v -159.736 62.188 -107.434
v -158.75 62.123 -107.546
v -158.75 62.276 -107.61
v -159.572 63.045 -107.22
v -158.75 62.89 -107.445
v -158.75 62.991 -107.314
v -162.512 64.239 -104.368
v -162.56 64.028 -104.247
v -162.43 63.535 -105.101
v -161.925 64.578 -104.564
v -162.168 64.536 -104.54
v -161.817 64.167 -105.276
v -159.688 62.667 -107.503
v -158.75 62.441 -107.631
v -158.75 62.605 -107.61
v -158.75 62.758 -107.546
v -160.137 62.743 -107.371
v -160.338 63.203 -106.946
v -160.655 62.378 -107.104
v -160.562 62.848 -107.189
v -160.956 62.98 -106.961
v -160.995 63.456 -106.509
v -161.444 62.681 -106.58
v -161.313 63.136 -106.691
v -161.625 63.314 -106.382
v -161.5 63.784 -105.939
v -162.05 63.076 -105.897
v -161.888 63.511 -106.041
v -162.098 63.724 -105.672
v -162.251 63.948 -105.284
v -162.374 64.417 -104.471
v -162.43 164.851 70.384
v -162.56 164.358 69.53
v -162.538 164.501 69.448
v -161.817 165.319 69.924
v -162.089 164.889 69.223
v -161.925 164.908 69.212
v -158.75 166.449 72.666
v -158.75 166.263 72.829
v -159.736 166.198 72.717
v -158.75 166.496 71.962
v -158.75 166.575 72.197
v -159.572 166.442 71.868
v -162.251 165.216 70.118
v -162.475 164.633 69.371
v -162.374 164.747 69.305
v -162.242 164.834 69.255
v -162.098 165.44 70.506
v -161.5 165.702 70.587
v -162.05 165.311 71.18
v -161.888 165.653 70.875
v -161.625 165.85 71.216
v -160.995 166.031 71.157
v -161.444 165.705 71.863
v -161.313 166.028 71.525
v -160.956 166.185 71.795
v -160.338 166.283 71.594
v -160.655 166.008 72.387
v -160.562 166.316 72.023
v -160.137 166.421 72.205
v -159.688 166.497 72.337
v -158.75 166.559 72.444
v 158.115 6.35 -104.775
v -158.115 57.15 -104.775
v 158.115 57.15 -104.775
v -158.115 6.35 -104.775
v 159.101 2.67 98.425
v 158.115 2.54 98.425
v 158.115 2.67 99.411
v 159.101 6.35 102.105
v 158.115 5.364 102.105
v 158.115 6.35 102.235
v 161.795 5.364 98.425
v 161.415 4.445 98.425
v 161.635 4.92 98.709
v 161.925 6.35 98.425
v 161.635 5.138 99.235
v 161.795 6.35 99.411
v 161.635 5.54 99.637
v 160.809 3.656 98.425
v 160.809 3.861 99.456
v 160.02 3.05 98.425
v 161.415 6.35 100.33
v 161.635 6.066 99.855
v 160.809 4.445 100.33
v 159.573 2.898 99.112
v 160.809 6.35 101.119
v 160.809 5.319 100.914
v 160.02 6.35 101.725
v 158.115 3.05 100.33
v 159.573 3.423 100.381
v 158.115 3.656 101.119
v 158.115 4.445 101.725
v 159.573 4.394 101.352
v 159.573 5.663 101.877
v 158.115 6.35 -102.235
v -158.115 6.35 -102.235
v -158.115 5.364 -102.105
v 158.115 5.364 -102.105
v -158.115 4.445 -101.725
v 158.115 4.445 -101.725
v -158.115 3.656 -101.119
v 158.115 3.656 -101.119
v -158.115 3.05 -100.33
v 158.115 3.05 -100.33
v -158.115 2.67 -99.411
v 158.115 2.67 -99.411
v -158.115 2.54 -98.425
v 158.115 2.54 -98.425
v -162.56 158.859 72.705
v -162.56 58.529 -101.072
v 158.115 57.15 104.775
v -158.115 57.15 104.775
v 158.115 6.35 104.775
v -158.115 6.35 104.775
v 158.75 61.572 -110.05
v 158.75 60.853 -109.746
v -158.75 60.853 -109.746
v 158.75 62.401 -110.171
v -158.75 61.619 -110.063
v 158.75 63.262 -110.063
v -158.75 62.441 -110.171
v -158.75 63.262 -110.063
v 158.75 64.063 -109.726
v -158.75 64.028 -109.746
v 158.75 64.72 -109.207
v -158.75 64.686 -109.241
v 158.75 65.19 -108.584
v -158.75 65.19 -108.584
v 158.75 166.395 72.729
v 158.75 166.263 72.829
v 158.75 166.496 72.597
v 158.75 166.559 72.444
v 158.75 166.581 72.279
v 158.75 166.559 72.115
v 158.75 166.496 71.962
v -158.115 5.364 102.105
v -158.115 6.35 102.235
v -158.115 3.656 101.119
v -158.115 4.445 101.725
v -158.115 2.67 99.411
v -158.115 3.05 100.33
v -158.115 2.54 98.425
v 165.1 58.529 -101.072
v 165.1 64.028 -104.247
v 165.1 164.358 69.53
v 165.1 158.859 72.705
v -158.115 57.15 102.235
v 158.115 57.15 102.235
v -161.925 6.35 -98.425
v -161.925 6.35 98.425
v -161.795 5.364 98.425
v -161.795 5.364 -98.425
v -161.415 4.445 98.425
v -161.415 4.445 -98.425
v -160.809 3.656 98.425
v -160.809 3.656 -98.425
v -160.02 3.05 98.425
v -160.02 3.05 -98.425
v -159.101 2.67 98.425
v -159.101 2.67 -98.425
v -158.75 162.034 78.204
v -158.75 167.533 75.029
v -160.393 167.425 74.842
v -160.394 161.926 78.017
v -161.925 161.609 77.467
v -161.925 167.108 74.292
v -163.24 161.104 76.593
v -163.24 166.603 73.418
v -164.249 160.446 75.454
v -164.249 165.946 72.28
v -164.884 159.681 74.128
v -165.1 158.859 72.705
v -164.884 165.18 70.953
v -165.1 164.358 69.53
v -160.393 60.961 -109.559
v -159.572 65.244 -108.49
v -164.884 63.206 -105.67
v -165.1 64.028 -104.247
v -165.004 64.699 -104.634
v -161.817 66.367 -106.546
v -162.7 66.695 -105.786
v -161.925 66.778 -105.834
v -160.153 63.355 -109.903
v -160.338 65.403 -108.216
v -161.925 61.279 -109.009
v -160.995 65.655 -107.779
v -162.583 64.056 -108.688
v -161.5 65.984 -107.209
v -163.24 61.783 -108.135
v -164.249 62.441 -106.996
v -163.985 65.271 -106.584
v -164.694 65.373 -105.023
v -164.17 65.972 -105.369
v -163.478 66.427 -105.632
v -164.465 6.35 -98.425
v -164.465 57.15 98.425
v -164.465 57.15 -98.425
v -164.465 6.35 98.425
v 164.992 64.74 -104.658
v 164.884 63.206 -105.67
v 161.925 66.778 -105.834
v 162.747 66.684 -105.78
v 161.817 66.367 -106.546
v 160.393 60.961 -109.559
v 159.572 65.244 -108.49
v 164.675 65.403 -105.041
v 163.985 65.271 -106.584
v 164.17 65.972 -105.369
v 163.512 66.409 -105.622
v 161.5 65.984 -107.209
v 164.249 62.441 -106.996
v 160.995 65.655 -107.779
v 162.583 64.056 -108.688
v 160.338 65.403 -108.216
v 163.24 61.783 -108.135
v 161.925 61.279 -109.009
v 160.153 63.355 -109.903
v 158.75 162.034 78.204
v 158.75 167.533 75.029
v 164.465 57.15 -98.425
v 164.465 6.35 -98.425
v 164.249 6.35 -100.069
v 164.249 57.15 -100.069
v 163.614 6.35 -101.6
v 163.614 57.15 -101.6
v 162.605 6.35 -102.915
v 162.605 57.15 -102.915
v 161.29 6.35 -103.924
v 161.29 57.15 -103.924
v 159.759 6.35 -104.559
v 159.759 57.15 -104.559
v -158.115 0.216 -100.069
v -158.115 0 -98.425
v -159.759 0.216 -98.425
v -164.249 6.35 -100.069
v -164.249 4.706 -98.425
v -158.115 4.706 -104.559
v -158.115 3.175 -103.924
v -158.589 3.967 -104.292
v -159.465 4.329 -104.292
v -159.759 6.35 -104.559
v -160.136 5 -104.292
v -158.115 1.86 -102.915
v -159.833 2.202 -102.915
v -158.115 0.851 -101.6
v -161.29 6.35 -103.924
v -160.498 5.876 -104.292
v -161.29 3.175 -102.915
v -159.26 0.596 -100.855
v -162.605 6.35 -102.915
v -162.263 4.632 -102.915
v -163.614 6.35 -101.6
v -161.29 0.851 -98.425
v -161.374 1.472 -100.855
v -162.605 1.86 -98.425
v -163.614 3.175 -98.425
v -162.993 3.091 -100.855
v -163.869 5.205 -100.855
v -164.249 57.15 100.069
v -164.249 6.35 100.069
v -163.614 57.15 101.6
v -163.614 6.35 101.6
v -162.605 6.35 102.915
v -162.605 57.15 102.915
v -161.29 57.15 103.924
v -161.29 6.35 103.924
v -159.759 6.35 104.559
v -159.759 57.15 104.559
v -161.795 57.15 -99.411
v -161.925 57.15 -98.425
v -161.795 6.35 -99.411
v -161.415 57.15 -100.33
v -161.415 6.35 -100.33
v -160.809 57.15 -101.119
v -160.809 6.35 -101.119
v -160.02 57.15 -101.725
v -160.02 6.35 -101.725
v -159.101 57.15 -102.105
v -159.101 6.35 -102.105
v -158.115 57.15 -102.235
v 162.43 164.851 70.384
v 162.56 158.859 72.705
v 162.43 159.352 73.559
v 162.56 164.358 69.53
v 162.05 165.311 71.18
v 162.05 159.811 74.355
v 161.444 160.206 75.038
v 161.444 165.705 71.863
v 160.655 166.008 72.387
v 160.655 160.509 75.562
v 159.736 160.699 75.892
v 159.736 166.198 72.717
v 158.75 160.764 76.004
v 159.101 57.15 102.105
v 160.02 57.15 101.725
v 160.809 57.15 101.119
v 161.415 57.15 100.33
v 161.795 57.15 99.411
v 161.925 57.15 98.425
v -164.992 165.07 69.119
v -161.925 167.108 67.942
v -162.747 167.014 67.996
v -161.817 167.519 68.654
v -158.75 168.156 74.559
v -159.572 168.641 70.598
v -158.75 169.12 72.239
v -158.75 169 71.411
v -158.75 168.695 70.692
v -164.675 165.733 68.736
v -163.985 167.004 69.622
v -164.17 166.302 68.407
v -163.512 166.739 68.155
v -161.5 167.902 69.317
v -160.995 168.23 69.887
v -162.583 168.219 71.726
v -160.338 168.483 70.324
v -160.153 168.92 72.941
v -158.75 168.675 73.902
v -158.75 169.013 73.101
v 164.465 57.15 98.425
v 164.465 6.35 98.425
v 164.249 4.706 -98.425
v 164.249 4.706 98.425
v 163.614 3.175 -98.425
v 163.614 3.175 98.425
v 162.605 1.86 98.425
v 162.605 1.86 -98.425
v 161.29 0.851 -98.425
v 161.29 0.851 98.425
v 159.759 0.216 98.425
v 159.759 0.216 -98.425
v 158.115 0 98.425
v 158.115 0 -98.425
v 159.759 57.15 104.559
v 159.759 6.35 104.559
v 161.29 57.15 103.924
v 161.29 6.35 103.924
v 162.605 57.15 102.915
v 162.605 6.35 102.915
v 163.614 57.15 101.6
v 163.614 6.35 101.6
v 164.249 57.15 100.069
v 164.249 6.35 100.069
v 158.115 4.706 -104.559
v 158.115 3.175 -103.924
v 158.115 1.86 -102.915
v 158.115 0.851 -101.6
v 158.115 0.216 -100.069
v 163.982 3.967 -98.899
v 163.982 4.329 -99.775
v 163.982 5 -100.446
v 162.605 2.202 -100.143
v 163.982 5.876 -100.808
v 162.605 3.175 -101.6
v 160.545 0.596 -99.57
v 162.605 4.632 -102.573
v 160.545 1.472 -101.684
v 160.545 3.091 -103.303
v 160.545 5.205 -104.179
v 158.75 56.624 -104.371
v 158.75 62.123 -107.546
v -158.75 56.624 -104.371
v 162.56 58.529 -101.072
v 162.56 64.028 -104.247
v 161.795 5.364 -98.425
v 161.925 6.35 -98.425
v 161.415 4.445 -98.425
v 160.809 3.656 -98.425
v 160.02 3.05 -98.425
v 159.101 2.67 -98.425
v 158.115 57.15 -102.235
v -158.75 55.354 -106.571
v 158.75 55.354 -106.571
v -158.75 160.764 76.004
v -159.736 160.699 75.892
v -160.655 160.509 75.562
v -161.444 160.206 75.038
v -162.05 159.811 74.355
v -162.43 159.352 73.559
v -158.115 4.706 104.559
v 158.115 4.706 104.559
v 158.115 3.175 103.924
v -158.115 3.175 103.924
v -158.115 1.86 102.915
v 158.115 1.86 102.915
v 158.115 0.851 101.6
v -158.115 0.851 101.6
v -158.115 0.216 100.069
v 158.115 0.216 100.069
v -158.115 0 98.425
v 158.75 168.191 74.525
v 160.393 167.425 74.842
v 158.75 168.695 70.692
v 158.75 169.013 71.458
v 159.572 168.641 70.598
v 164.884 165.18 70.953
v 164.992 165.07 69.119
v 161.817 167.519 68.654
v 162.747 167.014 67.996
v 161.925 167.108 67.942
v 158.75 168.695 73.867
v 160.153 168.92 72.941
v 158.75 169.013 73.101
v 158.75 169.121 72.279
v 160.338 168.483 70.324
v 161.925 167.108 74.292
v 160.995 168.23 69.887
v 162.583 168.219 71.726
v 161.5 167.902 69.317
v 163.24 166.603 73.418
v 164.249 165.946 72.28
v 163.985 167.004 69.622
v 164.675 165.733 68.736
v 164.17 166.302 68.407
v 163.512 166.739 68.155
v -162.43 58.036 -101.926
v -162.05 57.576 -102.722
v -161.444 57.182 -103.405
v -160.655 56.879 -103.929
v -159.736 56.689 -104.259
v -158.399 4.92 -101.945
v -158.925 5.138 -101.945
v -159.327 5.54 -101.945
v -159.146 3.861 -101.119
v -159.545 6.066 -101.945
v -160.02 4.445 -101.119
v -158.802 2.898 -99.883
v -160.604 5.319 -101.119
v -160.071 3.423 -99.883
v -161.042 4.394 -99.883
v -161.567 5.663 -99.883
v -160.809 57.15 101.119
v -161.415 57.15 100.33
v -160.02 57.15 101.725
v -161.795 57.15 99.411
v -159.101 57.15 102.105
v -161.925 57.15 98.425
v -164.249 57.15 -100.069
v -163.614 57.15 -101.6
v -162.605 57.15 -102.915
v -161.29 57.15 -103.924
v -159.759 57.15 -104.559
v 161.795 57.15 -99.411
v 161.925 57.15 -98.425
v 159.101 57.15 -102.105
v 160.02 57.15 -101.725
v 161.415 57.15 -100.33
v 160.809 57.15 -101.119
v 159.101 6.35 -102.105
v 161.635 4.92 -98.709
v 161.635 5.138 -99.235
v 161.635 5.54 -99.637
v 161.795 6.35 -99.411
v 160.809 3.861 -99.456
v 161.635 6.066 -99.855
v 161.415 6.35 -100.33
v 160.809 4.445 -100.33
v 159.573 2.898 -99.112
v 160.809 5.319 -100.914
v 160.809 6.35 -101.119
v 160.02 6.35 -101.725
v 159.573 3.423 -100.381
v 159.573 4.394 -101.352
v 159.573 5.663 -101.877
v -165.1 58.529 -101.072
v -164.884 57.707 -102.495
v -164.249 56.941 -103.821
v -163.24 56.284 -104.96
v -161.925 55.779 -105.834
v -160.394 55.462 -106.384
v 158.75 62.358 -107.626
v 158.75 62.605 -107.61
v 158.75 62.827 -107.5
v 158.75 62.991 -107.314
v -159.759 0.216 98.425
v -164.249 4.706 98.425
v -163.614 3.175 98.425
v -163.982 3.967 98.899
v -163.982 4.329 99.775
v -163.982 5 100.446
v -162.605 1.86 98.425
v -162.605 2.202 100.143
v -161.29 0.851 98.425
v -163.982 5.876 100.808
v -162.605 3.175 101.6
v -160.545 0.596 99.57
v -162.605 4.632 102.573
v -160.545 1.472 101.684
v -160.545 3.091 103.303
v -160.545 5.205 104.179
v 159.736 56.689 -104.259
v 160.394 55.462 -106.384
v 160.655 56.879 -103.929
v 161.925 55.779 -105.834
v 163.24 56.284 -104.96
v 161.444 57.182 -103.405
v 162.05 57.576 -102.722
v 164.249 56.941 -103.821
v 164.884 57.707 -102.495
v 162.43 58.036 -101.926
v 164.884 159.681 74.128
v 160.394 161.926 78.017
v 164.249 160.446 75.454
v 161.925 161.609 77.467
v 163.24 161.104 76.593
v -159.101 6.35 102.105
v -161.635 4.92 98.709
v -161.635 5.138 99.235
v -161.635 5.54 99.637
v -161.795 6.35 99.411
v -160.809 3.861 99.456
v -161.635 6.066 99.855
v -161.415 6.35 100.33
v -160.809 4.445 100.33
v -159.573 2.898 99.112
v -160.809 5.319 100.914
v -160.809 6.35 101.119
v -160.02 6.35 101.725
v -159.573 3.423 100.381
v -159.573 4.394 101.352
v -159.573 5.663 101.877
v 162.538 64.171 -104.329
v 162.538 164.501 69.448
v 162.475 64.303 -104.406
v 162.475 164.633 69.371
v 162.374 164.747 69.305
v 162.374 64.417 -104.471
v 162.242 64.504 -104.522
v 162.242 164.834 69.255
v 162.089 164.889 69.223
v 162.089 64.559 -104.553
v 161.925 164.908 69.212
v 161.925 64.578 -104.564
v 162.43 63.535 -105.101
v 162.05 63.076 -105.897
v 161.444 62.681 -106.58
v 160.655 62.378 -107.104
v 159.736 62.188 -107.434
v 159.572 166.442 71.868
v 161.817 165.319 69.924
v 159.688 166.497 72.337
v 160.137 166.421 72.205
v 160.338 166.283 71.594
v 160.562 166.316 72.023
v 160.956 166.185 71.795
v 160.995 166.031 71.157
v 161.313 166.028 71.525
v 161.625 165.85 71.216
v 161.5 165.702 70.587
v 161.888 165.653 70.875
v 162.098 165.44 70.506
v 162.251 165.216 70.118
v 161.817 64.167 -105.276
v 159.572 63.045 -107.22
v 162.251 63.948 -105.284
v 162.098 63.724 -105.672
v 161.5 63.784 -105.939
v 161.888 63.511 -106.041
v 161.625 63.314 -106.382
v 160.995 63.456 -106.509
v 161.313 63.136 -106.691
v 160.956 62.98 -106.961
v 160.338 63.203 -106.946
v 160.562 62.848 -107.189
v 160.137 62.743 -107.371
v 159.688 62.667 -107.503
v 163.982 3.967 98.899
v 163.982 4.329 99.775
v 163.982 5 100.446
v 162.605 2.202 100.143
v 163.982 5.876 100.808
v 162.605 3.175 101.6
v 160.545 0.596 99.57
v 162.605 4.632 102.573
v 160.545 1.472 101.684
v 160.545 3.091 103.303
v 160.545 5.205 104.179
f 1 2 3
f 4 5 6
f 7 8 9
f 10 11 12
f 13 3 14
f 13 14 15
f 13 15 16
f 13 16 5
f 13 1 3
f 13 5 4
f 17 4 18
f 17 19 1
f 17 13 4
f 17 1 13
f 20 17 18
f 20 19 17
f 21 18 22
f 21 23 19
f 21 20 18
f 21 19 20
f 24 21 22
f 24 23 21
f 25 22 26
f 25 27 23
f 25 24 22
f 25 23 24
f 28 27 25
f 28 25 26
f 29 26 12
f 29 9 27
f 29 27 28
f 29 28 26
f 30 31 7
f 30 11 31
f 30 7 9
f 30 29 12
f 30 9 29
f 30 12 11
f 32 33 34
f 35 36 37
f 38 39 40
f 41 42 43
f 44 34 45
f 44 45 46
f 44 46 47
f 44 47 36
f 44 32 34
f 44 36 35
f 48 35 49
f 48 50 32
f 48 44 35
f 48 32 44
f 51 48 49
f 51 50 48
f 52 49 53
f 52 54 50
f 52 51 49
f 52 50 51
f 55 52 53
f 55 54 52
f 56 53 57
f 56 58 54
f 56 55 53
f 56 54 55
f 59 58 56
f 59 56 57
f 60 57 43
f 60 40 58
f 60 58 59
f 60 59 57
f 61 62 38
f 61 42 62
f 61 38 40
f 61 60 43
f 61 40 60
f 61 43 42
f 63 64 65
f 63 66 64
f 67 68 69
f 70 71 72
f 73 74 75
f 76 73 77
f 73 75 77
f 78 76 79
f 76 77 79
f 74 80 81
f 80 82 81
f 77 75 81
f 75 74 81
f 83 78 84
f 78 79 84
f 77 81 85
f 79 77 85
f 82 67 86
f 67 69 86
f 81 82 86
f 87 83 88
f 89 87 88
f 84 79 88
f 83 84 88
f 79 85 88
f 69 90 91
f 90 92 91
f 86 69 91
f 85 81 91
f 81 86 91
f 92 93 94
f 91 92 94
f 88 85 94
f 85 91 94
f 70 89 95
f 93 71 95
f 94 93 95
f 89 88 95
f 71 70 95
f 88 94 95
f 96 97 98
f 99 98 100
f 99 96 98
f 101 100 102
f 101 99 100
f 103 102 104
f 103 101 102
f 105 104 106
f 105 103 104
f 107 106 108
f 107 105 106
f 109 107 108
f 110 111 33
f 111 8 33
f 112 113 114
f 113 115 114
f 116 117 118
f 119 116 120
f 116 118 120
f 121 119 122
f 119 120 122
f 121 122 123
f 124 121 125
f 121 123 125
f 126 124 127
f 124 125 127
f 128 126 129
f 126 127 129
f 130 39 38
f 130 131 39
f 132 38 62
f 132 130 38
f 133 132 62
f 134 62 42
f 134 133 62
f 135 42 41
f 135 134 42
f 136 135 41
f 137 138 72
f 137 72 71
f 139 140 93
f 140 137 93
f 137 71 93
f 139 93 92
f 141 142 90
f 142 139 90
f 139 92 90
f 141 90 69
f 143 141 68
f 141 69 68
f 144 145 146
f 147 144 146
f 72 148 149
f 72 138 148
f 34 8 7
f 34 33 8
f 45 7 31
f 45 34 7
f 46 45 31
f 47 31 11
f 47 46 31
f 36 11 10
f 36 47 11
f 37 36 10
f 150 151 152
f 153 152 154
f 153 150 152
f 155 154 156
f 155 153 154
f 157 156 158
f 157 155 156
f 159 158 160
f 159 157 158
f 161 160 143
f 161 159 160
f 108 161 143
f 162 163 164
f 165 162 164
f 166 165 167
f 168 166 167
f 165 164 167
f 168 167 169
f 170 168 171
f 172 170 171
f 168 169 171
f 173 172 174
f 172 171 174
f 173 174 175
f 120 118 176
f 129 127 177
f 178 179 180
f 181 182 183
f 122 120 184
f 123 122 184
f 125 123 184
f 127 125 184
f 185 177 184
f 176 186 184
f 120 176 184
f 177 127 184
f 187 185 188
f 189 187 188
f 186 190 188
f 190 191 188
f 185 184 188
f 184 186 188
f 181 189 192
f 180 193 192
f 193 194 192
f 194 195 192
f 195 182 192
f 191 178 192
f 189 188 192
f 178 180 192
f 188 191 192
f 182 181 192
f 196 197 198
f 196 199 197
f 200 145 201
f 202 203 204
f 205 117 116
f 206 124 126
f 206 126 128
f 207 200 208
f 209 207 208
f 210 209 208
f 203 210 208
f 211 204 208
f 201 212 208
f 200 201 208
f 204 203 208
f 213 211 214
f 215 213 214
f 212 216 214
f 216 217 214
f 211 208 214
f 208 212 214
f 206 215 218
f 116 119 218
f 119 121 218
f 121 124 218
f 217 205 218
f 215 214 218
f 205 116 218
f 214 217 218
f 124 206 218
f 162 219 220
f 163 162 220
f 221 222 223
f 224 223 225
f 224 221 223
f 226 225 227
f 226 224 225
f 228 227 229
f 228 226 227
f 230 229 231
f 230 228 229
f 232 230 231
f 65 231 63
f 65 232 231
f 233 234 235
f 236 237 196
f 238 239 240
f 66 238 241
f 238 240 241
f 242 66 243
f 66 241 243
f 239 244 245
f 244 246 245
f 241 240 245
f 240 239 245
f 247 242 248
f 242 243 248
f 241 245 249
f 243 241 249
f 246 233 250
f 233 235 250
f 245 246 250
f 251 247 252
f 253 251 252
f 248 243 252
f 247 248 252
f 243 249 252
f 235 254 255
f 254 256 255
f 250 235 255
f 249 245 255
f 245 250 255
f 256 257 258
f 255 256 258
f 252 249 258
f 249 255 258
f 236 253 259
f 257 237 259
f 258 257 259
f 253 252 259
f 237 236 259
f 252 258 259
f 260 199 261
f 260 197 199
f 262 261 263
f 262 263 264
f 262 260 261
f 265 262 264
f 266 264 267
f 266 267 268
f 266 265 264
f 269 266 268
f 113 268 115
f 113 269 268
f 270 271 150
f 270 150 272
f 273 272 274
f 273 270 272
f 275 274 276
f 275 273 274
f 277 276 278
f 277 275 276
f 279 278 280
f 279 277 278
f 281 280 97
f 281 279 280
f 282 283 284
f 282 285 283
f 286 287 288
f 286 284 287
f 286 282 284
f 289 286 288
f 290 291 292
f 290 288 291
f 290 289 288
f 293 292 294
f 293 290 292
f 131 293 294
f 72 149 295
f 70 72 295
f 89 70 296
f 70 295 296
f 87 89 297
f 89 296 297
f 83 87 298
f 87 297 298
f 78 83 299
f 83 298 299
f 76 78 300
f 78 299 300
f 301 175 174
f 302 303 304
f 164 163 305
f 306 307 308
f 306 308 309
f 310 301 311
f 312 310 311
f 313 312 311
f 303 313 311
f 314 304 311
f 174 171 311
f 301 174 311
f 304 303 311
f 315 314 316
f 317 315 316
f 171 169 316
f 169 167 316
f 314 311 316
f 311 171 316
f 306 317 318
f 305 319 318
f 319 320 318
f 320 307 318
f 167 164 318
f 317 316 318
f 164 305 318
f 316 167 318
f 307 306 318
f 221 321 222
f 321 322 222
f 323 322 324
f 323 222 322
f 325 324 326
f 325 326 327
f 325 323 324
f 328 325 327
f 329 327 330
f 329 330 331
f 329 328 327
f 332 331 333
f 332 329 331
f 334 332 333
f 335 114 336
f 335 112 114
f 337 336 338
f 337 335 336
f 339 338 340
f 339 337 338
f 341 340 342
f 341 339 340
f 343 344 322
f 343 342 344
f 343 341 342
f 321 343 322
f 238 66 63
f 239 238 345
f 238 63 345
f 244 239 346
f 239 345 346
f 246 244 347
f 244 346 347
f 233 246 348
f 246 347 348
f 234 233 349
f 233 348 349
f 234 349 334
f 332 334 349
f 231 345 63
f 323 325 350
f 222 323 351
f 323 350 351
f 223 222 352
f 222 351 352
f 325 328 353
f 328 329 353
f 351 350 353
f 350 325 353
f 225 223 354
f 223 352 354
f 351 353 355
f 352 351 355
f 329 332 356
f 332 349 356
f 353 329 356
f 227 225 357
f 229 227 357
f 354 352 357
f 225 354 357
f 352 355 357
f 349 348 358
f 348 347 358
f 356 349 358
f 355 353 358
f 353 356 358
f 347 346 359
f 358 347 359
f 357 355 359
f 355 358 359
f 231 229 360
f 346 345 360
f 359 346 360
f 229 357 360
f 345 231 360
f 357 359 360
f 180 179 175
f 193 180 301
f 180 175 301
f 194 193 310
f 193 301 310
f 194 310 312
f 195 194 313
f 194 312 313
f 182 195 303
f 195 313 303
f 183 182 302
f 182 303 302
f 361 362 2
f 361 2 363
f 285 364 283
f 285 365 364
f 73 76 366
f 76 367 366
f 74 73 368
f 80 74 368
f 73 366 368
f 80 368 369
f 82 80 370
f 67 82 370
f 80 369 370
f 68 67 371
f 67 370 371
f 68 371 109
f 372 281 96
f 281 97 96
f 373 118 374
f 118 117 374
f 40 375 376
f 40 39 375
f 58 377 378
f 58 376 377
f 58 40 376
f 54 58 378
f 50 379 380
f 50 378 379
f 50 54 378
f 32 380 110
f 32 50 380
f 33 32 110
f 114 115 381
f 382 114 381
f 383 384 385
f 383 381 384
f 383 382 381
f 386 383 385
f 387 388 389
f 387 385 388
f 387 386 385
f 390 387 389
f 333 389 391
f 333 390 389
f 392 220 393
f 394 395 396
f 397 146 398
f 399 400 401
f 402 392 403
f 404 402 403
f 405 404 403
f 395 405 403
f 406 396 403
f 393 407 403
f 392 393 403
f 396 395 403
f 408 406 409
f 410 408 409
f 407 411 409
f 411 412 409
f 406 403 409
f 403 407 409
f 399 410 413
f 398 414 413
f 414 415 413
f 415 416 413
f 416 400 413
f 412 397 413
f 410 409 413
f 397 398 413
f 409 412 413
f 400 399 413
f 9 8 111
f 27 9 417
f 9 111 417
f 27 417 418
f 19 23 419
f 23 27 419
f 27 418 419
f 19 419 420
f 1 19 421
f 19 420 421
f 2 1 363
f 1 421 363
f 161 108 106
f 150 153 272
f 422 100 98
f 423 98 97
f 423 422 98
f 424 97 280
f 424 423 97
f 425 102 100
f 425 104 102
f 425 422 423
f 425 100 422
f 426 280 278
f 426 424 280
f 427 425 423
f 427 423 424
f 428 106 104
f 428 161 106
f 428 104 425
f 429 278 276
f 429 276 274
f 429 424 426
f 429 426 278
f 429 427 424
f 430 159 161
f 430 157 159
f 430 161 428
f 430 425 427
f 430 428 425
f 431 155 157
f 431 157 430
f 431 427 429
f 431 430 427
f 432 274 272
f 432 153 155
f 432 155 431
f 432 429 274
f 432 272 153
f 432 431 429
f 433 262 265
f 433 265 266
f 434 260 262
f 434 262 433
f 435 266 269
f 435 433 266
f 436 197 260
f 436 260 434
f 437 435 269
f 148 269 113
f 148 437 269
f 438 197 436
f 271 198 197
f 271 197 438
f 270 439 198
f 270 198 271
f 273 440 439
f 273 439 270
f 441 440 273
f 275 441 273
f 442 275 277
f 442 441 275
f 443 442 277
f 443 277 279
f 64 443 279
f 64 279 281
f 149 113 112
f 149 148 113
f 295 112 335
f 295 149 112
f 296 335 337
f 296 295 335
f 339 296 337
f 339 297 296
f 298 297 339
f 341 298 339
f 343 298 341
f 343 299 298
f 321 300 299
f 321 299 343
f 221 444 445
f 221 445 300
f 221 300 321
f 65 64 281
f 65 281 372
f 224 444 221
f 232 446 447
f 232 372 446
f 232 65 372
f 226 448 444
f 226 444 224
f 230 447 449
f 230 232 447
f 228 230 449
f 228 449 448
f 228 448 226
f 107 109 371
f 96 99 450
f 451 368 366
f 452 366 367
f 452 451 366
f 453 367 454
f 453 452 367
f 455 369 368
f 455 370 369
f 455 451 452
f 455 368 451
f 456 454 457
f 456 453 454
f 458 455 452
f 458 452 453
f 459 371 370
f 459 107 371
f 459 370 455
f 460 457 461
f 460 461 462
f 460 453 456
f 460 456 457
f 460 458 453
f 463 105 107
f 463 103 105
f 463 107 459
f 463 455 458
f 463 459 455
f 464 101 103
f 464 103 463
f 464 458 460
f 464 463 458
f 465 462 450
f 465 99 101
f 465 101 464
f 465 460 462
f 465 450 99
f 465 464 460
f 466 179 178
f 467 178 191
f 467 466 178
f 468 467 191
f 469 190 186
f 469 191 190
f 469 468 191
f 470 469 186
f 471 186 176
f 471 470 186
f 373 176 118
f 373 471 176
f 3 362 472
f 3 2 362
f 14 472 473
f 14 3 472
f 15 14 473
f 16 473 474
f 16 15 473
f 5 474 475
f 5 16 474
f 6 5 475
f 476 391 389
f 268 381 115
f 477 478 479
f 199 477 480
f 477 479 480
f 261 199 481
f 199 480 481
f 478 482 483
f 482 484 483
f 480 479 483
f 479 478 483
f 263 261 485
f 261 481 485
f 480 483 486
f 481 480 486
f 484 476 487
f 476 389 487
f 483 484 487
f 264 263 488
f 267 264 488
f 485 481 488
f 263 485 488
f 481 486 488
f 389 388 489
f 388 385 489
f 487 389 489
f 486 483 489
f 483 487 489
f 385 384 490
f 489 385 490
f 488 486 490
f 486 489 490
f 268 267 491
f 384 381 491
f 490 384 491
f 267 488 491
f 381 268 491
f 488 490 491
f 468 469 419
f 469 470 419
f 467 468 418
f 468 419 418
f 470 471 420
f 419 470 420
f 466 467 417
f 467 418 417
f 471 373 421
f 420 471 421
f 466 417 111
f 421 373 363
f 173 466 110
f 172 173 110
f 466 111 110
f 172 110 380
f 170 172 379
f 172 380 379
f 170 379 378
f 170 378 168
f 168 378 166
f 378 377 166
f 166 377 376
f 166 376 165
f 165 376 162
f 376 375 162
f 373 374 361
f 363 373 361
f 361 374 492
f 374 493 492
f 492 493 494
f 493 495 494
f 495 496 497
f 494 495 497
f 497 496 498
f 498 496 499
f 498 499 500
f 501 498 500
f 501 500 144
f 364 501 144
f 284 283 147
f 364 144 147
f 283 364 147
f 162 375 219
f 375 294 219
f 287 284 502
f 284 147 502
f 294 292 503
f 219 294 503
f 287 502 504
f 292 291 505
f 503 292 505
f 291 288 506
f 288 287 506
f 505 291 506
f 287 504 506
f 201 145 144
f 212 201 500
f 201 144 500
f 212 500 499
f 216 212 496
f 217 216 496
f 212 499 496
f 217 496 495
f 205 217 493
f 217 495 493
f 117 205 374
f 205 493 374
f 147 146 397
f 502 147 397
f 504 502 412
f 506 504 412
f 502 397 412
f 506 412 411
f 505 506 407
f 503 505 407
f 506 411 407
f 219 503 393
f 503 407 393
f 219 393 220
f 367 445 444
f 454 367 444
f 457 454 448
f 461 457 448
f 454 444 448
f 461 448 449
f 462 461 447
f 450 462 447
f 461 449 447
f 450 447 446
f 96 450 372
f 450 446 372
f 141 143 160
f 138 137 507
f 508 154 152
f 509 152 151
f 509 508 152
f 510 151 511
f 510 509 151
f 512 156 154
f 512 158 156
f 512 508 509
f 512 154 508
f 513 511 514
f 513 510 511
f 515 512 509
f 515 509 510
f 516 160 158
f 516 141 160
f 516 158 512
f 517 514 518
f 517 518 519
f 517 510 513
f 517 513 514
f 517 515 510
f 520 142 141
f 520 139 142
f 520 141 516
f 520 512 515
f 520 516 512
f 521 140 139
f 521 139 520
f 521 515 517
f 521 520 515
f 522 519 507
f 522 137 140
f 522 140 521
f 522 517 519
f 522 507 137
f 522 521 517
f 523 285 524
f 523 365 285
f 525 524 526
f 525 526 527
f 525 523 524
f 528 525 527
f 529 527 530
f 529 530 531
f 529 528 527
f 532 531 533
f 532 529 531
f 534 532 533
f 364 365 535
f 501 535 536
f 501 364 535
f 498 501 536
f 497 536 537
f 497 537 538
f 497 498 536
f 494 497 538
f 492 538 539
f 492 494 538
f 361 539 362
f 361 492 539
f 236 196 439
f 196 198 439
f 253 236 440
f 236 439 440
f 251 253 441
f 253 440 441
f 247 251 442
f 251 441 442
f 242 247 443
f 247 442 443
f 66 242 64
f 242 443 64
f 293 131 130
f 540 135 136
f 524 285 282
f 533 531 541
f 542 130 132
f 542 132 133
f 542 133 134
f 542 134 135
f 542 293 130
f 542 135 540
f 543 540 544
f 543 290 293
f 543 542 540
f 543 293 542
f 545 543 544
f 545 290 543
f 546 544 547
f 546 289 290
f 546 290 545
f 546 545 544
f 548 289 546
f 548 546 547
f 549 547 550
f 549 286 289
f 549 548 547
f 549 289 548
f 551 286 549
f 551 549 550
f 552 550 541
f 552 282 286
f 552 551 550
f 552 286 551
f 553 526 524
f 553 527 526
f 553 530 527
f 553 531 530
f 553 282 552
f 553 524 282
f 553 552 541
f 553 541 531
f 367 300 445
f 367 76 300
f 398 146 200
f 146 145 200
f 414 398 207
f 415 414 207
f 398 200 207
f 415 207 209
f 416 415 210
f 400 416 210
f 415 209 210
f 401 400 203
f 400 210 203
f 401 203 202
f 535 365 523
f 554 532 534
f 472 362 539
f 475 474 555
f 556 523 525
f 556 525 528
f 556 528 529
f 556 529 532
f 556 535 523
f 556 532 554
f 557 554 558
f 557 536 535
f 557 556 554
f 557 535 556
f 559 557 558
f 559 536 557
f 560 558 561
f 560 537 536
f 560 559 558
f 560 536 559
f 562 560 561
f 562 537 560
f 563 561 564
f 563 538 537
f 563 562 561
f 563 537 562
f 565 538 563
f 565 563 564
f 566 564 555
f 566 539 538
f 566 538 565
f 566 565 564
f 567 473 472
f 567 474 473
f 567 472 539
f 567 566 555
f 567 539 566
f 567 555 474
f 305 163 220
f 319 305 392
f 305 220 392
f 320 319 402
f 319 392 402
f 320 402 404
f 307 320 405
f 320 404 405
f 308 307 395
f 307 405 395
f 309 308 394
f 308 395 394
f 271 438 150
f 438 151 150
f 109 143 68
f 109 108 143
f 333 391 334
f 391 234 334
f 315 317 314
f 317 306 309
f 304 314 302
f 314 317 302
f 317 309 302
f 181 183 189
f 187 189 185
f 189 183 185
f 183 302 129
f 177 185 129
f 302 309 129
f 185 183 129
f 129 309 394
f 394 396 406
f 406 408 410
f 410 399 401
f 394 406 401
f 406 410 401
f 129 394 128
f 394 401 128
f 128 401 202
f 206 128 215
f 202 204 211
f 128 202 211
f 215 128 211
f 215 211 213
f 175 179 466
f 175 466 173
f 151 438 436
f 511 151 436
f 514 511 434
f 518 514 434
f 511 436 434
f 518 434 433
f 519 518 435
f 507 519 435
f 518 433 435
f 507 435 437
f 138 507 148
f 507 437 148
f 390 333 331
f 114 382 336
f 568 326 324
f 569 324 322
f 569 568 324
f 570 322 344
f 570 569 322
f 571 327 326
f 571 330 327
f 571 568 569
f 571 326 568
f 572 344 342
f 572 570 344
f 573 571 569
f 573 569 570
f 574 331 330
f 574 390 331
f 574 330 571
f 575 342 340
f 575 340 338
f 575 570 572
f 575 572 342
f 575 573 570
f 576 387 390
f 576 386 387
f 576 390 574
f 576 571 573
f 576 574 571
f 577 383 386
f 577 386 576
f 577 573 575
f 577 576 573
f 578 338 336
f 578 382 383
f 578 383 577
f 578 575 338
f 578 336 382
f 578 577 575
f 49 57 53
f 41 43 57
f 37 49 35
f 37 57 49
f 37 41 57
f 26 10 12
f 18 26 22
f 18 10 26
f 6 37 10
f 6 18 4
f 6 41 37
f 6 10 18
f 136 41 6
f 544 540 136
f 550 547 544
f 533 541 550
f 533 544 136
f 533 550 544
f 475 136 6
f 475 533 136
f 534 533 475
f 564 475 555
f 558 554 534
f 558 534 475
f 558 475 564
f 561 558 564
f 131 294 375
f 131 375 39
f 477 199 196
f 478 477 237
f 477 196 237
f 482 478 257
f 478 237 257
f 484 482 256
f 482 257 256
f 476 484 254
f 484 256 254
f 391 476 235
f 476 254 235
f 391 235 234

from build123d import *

# Parameters (mm, degrees)
SKETCH1_W                       = 328.93
SKETCH1_H                       = 209.55
BOSS_EXTRUDE1_DEPTH             = 57.15
FILLET1_R                       = 6.35
SHELL1_T                        = -2.54
LID_OPENING_ANGLE_CONTROL_DEPTH = 165.1
FILLET2_R                       = 6.35
FILLET3_R                       = 3.175
SHELL2_T                        = -2.54


with BuildPart() as part:
    # Sketch1 → Boss-Extrude1 (new body)
    with BuildSketch(Plane(origin=(0, 0, 0), x_dir=(1, 0, 0), z_dir=(0, 1, 0))):
        Rectangle(SKETCH1_W, SKETCH1_H)
    extrude(amount=BOSS_EXTRUDE1_DEPTH)

    # Fillet1
    fillet1_edges = [part.edges().sort_by_distance(p)[0] for p in [
        (0, 0, 104.775),
        (-164.465, 0, 0),
        (0, 0, -104.775),
        (164.465, 0, 0),
        (164.465, 28.575, 104.775),
        (-164.465, 28.575, 104.775),
        (-164.465, 28.575, -104.775),
        (164.465, 28.575, -104.775),
    ]]
    fillet(fillet1_edges, radius=FILLET1_R)

    # Shell1
    shell1_openings = [part.faces().sort_by_distance(p)[0] for p in [
        (0, 57.15, 0),
    ]]
    offset(amount=SHELL1_T, openings=shell1_openings, kind=Kind.INTERSECTION)


with BuildPart() as body_2:
    # Sketch2 → LID OPENING ANGLE CONTROL (new, symmetric)
    with BuildSketch(Plane(origin=(0, 0, 0), x_dir=(0, 0, -1), z_dir=(1, 0, 0))):
        Polygon((106.571051224, 55.353948776), (-78.204128927, 162.033948776), (-73.441628927, 170.282840747), (111.333551224, 63.602840747), align=None)
    extrude(amount=LID_OPENING_ANGLE_CONTROL_DEPTH, both=True)

    # Fillet2
    fillet2_edges = [body_2.edges().sort_by_distance(p)[0] for p in [
        (165.1, 166.158394761, 75.822878927),
        (165.1, 59.478394761, -108.952301224),
        (-165.1, 166.158394761, 75.822878927),
        (-165.1, 59.478394761, -108.952301224),
    ]]
    fillet(fillet2_edges, radius=FILLET2_R)

    # Fillet3
    fillet3_edges = [body_2.edges().sort_by_distance(p)[0] for p in [
        (165.1, 116.942840747, -18.945961148),
        (-165.1, 116.942840747, -18.945961148),
        (0, 170.282840747, 73.441628927),
        (0, 63.602840747, -111.333551224),
        (-163.240128061, 169.352904777, 71.83093258),
        (163.240128061, 169.352904777, 71.83093258),
        (-163.240128061, 64.532776717, -109.722854877),
        (163.240128061, 64.532776717, -109.722854877),
    ]]
    fillet(fillet3_edges, radius=FILLET3_R)

    # Shell2
    shell2_openings = [body_2.faces().sort_by_distance(p)[0] for p in [
        (0, 108.693948776, -14.183461148),
    ]]
    offset(amount=SHELL2_T, openings=shell2_openings, kind=Kind.INTERSECTION)


solid = Compound([part.part, body_2.part])
